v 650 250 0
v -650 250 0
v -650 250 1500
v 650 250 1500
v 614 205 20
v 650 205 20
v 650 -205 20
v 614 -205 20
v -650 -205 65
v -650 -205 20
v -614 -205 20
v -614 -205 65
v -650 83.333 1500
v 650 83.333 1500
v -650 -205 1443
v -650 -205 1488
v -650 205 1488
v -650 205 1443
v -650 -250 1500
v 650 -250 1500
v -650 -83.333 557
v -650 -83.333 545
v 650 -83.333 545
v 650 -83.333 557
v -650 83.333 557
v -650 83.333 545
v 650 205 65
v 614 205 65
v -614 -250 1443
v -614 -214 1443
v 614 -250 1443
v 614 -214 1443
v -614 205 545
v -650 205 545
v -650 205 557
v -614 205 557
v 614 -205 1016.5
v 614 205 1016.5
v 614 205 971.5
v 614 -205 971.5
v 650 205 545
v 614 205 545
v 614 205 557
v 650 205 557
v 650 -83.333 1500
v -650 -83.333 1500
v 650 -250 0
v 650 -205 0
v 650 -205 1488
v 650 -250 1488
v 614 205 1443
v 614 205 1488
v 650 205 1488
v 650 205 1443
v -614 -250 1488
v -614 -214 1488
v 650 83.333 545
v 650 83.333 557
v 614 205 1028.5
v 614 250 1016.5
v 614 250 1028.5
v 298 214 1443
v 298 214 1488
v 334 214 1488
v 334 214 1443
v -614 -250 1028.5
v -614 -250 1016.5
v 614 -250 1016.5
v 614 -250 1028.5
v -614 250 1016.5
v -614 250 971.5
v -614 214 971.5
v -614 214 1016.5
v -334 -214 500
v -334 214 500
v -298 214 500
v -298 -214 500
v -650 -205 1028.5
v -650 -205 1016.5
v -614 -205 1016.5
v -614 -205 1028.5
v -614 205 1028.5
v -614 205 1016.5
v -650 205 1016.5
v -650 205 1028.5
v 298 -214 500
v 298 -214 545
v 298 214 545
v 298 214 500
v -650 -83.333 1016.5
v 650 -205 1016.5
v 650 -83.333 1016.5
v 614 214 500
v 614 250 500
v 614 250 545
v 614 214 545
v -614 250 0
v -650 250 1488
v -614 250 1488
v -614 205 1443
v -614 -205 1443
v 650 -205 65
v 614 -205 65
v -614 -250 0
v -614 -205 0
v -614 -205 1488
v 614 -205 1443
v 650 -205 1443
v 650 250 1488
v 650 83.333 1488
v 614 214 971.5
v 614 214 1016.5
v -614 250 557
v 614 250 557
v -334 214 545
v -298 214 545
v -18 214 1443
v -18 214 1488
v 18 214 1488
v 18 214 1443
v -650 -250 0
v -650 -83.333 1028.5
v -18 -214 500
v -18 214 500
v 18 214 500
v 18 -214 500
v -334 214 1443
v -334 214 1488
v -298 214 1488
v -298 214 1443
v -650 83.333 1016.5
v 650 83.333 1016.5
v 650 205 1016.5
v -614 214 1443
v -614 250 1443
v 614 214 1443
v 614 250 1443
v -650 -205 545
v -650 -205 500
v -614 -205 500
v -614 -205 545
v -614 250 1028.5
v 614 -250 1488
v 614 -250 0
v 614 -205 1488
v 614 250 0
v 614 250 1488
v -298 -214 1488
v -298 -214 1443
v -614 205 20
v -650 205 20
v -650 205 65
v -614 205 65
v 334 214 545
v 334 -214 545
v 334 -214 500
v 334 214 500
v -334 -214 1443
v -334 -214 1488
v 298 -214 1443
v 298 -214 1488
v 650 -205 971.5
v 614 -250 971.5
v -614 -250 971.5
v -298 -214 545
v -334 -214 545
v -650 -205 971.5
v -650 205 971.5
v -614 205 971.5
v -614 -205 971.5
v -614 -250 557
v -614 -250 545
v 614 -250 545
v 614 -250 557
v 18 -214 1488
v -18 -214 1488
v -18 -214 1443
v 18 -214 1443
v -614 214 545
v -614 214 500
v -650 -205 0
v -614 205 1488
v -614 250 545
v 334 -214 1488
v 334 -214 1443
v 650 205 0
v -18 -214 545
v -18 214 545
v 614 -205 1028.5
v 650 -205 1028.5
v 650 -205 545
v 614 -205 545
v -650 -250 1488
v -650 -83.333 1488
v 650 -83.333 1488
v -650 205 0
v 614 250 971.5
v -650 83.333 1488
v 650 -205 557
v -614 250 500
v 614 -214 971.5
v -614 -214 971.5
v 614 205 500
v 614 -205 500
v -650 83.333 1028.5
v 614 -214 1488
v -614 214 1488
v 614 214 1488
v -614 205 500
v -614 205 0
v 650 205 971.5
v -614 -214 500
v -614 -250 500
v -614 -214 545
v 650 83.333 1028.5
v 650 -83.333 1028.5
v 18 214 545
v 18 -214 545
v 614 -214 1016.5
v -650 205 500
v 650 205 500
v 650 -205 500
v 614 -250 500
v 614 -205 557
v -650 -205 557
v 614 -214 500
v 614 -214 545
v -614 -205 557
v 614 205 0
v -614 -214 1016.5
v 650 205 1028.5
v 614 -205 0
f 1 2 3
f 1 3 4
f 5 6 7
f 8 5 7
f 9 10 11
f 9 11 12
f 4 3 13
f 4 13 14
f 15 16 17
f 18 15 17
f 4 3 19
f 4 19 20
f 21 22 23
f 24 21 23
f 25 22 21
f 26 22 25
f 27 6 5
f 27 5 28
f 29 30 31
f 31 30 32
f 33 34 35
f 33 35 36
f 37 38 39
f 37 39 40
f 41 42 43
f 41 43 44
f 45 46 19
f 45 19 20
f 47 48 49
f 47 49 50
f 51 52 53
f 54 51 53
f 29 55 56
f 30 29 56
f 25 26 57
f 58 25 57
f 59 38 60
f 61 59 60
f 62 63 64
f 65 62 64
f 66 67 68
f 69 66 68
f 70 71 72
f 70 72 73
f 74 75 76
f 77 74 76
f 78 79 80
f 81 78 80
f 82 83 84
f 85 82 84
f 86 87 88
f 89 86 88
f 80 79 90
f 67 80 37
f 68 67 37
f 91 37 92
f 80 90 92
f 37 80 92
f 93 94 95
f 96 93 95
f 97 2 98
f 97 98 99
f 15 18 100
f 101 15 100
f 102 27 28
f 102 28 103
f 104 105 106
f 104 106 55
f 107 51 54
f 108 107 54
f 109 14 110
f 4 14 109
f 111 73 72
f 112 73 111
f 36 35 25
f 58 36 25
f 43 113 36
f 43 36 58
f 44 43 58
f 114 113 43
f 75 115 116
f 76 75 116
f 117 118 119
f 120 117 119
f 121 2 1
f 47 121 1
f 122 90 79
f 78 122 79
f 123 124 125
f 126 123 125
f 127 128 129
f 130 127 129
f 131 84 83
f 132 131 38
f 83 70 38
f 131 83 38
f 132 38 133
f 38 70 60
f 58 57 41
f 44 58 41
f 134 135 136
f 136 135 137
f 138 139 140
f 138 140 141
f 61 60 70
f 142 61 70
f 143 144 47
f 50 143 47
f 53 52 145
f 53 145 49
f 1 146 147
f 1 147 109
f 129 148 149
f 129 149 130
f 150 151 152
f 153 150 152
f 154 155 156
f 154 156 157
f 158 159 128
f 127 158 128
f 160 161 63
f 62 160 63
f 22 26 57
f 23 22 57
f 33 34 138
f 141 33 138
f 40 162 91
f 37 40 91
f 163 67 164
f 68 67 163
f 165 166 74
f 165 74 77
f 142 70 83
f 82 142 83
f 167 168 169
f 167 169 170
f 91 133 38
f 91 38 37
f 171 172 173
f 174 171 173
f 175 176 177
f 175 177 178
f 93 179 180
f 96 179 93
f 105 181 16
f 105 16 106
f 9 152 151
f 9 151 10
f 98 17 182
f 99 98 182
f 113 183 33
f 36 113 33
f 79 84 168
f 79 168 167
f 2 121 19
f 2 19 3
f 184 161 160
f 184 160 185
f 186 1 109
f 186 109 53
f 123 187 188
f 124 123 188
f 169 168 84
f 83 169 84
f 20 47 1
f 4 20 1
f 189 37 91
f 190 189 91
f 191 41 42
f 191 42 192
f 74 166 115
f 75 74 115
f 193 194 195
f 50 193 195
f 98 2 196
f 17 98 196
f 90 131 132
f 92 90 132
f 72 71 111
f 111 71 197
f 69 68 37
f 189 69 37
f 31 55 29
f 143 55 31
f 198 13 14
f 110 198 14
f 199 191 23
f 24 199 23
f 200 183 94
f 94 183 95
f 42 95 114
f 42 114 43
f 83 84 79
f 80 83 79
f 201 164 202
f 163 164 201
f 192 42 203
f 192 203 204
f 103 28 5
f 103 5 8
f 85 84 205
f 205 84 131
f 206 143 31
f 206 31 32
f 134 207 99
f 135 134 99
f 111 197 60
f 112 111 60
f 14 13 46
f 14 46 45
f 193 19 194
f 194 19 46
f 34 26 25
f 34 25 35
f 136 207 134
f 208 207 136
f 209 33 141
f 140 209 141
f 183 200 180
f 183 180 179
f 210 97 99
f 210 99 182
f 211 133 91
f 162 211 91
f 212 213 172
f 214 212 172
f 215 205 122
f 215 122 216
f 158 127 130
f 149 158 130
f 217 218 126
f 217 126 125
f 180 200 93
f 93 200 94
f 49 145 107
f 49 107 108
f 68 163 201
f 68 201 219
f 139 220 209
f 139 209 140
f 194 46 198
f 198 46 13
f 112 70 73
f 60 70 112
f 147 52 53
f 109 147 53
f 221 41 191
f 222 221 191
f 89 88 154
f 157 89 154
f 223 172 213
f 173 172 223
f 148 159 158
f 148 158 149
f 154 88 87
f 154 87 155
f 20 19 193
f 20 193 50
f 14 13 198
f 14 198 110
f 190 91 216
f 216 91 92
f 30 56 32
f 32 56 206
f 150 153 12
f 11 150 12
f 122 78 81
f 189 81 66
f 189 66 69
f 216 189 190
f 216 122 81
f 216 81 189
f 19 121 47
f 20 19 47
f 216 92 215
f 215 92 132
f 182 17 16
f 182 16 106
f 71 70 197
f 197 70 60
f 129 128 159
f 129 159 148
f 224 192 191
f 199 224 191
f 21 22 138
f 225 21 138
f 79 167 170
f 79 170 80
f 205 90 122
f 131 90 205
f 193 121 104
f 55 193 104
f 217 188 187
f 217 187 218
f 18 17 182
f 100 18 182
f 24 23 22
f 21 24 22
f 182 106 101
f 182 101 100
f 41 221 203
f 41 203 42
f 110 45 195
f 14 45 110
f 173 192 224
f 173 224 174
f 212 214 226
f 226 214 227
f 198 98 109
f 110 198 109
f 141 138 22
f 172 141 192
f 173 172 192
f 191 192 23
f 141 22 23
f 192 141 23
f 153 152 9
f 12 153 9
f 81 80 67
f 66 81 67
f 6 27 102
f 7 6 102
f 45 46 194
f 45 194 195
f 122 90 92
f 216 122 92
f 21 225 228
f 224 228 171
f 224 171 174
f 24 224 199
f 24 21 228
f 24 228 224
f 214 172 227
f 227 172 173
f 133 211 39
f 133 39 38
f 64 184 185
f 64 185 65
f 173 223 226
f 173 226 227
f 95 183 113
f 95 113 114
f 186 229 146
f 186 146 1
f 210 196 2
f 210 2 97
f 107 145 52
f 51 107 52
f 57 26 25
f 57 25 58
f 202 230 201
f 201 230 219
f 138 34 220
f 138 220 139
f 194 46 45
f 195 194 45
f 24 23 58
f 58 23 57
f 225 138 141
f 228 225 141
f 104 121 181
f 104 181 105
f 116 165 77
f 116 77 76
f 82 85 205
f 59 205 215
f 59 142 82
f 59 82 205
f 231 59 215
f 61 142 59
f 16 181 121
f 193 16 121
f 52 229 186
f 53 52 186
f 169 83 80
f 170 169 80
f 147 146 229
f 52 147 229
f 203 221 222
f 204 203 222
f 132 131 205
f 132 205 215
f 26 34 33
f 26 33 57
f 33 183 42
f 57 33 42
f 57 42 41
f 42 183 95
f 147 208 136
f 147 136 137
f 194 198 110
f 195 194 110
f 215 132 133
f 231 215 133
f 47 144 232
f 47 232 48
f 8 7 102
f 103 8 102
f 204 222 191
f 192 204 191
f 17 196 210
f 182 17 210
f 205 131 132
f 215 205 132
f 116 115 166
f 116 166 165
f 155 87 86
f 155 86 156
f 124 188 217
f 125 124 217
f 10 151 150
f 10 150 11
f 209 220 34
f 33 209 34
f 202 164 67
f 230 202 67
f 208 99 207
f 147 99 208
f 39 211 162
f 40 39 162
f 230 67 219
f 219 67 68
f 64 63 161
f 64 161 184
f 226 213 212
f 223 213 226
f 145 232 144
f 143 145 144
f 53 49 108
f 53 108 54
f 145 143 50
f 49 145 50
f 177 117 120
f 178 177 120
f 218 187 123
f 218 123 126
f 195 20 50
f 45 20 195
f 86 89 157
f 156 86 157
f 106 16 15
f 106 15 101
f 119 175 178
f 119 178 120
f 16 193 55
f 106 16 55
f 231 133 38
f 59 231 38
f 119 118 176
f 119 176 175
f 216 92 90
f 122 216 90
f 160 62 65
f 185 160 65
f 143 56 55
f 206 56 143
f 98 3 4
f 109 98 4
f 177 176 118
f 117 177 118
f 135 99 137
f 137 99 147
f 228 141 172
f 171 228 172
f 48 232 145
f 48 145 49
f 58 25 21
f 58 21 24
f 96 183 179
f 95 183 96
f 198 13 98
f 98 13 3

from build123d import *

# Parameters (mm, degrees)
F1_W      = 1300
F1_H      = 500
F2_DEPTH  = 1500
F4_W      = 36
F4_H      = 45
F5_DEPTH  = 1488
F6_W      = 36
F6_H      = 410
F7_DEPTH  = 45
F6_W_2    = 1228
F6_H_2    = 36
F8_W      = 36
F8_H      = 428
F9_DEPTH  = 45
F10_W     = 1300
F10_H     = 166.6666666667
F11_DEPTH = 12
F12_DEPTH = 12
F13_DEPTH = 12
F14_W     = 1228
F14_H     = 45
F15_DEPTH = 36
F17_W     = 410
F17_H     = 45
F18_DEPTH = 36
F20_W     = 36
F20_H     = 428
F21_DEPTH = 45
F22_W     = 1228
F22_H     = 36
F23_DEPTH = 12
F22_W_2   = 1300
F22_H_2   = 166.6666666667
F24_DEPTH = 12
F25_DEPTH = 12
F28_W     = 410
F28_H     = 45
F29_DEPTH = 36
F31_W     = 1228
F31_H     = 45
F32_DEPTH = 36
F34_W     = 410
F34_H     = 45
F35_DEPTH = 36
F37_W     = 1228
F37_H     = 36
F38_DEPTH = 12
F37_W_2   = 1300
F37_H_2   = 166.6666666667
F39_DEPTH = 12
F40_DEPTH = 12


with BuildPart() as f2:
    # F1 (on Top) → F2 (new body)
    with BuildSketch(Plane.XY):
        Rectangle(F1_W, F1_H)
    extrude(amount=F2_DEPTH)


with BuildPart() as f5:
    # F4 (on face) → F5 (new body, through all)
    with BuildSketch(Plane(origin=(0, 0, 0), x_dir=(1, 0, 0), z_dir=(0, 0, -1))):
        with Locations((-632, 227.5)):
            Rectangle(F4_W, F4_H)
    extrude(amount=-F5_DEPTH)


with BuildPart() as f5b:
    # F4 (on face) → F5, piece 2 (new body, through all)
    with BuildSketch(Plane(origin=(0, 0, 0), x_dir=(1, 0, 0), z_dir=(0, 0, -1))):
        with Locations((-632, -227.5)):
            Rectangle(F4_W, F4_H)
    extrude(amount=-F5_DEPTH)


with BuildPart() as f5c:
    # F4 (on face) → F5, piece 3 (new body, through all)
    with BuildSketch(Plane(origin=(0, 0, 0), x_dir=(1, 0, 0), z_dir=(0, 0, -1))):
        with Locations((632, 227.5)):
            Rectangle(F4_W, F4_H)
    extrude(amount=-F5_DEPTH)


with BuildPart() as f5d:
    # F4 (on face) → F5, piece 4 (new body, through all)
    with BuildSketch(Plane(origin=(0, 0, 0), x_dir=(1, 0, 0), z_dir=(0, 0, -1))):
        with Locations((632, -227.5)):
            Rectangle(F4_W, F4_H)
    extrude(amount=-F5_DEPTH)


with BuildPart() as f7:
    # F6 (on offset) → F7 (new body)
    with BuildSketch(Plane.XY.offset(1488)):
        with Locations((-632, 0)):
            Rectangle(F6_W, F6_H)
    extrude(amount=-F7_DEPTH)


with BuildPart() as f7b:
    # F6 (on offset) → F7, piece 2 (new body)
    with BuildSketch(Plane.XY.offset(1488)):
        with Locations((0, 232)):
            Rectangle(F6_W_2, F6_H_2)
    extrude(amount=-F7_DEPTH)


with BuildPart() as f7c:
    # F6 (on offset) → F7, piece 3 (new body)
    with BuildSketch(Plane.XY.offset(1488)):
        with Locations((632, 0)):
            Rectangle(F6_W, F6_H)
    extrude(amount=-F7_DEPTH)


with BuildPart() as f7d:
    # F6 (on offset) → F7, piece 4 (new body)
    with BuildSketch(Plane.XY.offset(1488)):
        with Locations((0, -232)):
            Rectangle(F6_W_2, F6_H_2)
    extrude(amount=-F7_DEPTH)


with BuildPart() as f9:
    # F8 (on offset) → F9 (new body)
    with BuildSketch(Plane.XY.offset(1488)):
        with Locations((-316, 0)):
            Rectangle(F8_W, F8_H)
    extrude(amount=-F9_DEPTH)


with BuildPart() as f9b:
    # F8 (on offset) → F9, piece 2 (new body)
    with BuildSketch(Plane.XY.offset(1488)):
        Rectangle(F8_W, F8_H)
    extrude(amount=-F9_DEPTH)


with BuildPart() as f9c:
    # F8 (on offset) → F9, piece 3 (new body)
    with BuildSketch(Plane.XY.offset(1488)):
        with Locations((316, 0)):
            Rectangle(F8_W, F8_H)
    extrude(amount=-F9_DEPTH)


with BuildPart() as f11:
    # F10 (on face) → F11 (new body)
    with BuildSketch(Plane.XY.offset(1500)):
        with Locations((0, -166.6666666667)):
            Rectangle(F10_W, F10_H)
    extrude(amount=-F11_DEPTH)


with BuildPart() as f12:
    # F10 (on face) → F12 (new body)
    with BuildSketch(Plane.XY.offset(1500)):
        Rectangle(F10_W, F10_H)
    extrude(amount=-F12_DEPTH)


with BuildPart() as f13:
    # F10 (on face) → F13 (new body)
    with BuildSketch(Plane.XY.offset(1500)):
        with Locations((0, 166.6666666667)):
            Rectangle(F10_W, F10_H)
    extrude(amount=-F13_DEPTH)


with BuildPart() as f15:
    # F14 (on face) → F15 (new body)
    with BuildSketch(Plane.XZ.offset(250)):
        with Locations((0, 522.5)):
            Rectangle(F14_W, F14_H)
    extrude(amount=-F15_DEPTH)


with BuildPart() as f16_1:
    # F16: instance of F15
    add(f15.part.mirror(Plane.XZ))


with BuildPart() as f18:
    # F17 (on face) → F18 (new body)
    with BuildSketch(Plane(origin=(-650, 0, 0), x_dir=(0, -1, 0), z_dir=(-1, 0, 0))):
        with Locations((0, 522.5)):
            Rectangle(F17_W, F17_H)
    extrude(amount=-F18_DEPTH)


with BuildPart() as f19_1:
    # F19: instance of F18
    add(f18.part.mirror(Plane.YZ))


with BuildPart() as f21:
    # F20 (on face) → F21 (new body)
    with BuildSketch(Plane.XY.offset(545)):
        with Locations((-316, 0)):
            Rectangle(F20_W, F20_H)
    extrude(amount=-F21_DEPTH)


with BuildPart() as f21b:
    # F20 (on face) → F21, piece 2 (new body)
    with BuildSketch(Plane.XY.offset(545)):
        Rectangle(F20_W, F20_H)
    extrude(amount=-F21_DEPTH)


with BuildPart() as f21c:
    # F20 (on face) → F21, piece 3 (new body)
    with BuildSketch(Plane.XY.offset(545)):
        with Locations((316, 0)):
            Rectangle(F20_W, F20_H)
    extrude(amount=-F21_DEPTH)


with BuildPart() as f23:
    # F22 (on face) → F23 (new body)
    with BuildSketch(Plane.XY.offset(545)):
        Polygon((650, -250), (650, -83.3333333333), (-650, -83.3333333333), (-650, -250), (-614, -250), (-614, -214), (614, -214), (614, -250), align=None)
        with Locations((0, -232)):
            Rectangle(F22_W, F22_H)
    extrude(amount=F23_DEPTH)

    # F26: cut F5, F5c
    add(f5.part, mode=Mode.SUBTRACT)
    add(f5c.part, mode=Mode.SUBTRACT)


with BuildPart() as f24:
    # F22 (on face) → F24 (new body)
    with BuildSketch(Plane.XY.offset(545)):
        Rectangle(F22_W_2, F22_H_2)
    extrude(amount=F24_DEPTH)


with BuildPart() as f25:
    # F22 (on face) → F25 (new body)
    with BuildSketch(Plane.XY.offset(545)):
        with Locations((0, 166.6666666667)):
            Rectangle(F22_W_2, F22_H_2)
    extrude(amount=F25_DEPTH)

    # F27: cut F5b, F5d
    add(f5b.part, mode=Mode.SUBTRACT)
    add(f5d.part, mode=Mode.SUBTRACT)


with BuildPart() as f29:
    # F28 (on face) → F29 (new body)
    with BuildSketch(Plane(origin=(-650, 0, 0), x_dir=(0, -1, 0), z_dir=(-1, 0, 0))):
        with Locations((0, 42.5)):
            Rectangle(F28_W, F28_H)
    extrude(amount=-F29_DEPTH)


with BuildPart() as f30_1:
    # F30: instance of F29
    add(f29.part.mirror(Plane.YZ))


with BuildPart() as f32:
    # F31 (on face) → F32 (new body)
    with BuildSketch(Plane.XZ.offset(250)):
        with Locations((0, 994)):
            Rectangle(F31_W, F31_H)
    extrude(amount=-F32_DEPTH)


with BuildPart() as f33_1:
    # F33: instance of F32
    add(f32.part.mirror(Plane.XZ))


with BuildPart() as f35:
    # F34 (on face) → F35 (new body)
    with BuildSketch(Plane(origin=(-650, 0, 0), x_dir=(0, -1, 0), z_dir=(-1, 0, 0))):
        with Locations((0, 994)):
            Rectangle(F34_W, F34_H)
    extrude(amount=-F35_DEPTH)


with BuildPart() as f36_1:
    # F36: instance of F35
    add(f35.part.mirror(Plane.YZ))


with BuildPart() as f38:
    # F37 (on face) → F38 (new body)
    with BuildSketch(Plane.XY.offset(1016.5)):
        Polygon((-650, -83.3333333333), (-650, -205), (-614, -205), (-614, -214), (614, -214), (614, -205), (650, -205), (650, -83.3333333333), align=None)
        with Locations((0, -232)):
            Rectangle(F37_W, F37_H)
    extrude(amount=F38_DEPTH)


with BuildPart() as f39:
    # F37 (on face) → F39 (new body)
    with BuildSketch(Plane.XY.offset(1016.5)):
        Rectangle(F37_W_2, F37_H_2)
    extrude(amount=F39_DEPTH)


with BuildPart() as f40:
    # F37 (on face) → F40 (new body)
    with BuildSketch(Plane.XY.offset(1016.5)):
        Polygon((-650, 205), (-650, 83.3333333333), (650, 83.3333333333), (650, 205), (614, 205), (614, 250), (-614, 250), (-614, 205), align=None)
    extrude(amount=F40_DEPTH)


solid = Compound([f2.part, f5.part, f5b.part, f5c.part, f5d.part, f7.part, f7b.part, f7c.part, f7d.part, f9.part, f9b.part, f9c.part, f11.part, f12.part, f13.part, f15.part, f16_1.part, f18.part, f19_1.part, f21.part, f21b.part, f21c.part, f23.part, f24.part, f25.part, f29.part, f30_1.part, f32.part, f33_1.part, f35.part, f36_1.part, f38.part, f39.part, f40.part])
